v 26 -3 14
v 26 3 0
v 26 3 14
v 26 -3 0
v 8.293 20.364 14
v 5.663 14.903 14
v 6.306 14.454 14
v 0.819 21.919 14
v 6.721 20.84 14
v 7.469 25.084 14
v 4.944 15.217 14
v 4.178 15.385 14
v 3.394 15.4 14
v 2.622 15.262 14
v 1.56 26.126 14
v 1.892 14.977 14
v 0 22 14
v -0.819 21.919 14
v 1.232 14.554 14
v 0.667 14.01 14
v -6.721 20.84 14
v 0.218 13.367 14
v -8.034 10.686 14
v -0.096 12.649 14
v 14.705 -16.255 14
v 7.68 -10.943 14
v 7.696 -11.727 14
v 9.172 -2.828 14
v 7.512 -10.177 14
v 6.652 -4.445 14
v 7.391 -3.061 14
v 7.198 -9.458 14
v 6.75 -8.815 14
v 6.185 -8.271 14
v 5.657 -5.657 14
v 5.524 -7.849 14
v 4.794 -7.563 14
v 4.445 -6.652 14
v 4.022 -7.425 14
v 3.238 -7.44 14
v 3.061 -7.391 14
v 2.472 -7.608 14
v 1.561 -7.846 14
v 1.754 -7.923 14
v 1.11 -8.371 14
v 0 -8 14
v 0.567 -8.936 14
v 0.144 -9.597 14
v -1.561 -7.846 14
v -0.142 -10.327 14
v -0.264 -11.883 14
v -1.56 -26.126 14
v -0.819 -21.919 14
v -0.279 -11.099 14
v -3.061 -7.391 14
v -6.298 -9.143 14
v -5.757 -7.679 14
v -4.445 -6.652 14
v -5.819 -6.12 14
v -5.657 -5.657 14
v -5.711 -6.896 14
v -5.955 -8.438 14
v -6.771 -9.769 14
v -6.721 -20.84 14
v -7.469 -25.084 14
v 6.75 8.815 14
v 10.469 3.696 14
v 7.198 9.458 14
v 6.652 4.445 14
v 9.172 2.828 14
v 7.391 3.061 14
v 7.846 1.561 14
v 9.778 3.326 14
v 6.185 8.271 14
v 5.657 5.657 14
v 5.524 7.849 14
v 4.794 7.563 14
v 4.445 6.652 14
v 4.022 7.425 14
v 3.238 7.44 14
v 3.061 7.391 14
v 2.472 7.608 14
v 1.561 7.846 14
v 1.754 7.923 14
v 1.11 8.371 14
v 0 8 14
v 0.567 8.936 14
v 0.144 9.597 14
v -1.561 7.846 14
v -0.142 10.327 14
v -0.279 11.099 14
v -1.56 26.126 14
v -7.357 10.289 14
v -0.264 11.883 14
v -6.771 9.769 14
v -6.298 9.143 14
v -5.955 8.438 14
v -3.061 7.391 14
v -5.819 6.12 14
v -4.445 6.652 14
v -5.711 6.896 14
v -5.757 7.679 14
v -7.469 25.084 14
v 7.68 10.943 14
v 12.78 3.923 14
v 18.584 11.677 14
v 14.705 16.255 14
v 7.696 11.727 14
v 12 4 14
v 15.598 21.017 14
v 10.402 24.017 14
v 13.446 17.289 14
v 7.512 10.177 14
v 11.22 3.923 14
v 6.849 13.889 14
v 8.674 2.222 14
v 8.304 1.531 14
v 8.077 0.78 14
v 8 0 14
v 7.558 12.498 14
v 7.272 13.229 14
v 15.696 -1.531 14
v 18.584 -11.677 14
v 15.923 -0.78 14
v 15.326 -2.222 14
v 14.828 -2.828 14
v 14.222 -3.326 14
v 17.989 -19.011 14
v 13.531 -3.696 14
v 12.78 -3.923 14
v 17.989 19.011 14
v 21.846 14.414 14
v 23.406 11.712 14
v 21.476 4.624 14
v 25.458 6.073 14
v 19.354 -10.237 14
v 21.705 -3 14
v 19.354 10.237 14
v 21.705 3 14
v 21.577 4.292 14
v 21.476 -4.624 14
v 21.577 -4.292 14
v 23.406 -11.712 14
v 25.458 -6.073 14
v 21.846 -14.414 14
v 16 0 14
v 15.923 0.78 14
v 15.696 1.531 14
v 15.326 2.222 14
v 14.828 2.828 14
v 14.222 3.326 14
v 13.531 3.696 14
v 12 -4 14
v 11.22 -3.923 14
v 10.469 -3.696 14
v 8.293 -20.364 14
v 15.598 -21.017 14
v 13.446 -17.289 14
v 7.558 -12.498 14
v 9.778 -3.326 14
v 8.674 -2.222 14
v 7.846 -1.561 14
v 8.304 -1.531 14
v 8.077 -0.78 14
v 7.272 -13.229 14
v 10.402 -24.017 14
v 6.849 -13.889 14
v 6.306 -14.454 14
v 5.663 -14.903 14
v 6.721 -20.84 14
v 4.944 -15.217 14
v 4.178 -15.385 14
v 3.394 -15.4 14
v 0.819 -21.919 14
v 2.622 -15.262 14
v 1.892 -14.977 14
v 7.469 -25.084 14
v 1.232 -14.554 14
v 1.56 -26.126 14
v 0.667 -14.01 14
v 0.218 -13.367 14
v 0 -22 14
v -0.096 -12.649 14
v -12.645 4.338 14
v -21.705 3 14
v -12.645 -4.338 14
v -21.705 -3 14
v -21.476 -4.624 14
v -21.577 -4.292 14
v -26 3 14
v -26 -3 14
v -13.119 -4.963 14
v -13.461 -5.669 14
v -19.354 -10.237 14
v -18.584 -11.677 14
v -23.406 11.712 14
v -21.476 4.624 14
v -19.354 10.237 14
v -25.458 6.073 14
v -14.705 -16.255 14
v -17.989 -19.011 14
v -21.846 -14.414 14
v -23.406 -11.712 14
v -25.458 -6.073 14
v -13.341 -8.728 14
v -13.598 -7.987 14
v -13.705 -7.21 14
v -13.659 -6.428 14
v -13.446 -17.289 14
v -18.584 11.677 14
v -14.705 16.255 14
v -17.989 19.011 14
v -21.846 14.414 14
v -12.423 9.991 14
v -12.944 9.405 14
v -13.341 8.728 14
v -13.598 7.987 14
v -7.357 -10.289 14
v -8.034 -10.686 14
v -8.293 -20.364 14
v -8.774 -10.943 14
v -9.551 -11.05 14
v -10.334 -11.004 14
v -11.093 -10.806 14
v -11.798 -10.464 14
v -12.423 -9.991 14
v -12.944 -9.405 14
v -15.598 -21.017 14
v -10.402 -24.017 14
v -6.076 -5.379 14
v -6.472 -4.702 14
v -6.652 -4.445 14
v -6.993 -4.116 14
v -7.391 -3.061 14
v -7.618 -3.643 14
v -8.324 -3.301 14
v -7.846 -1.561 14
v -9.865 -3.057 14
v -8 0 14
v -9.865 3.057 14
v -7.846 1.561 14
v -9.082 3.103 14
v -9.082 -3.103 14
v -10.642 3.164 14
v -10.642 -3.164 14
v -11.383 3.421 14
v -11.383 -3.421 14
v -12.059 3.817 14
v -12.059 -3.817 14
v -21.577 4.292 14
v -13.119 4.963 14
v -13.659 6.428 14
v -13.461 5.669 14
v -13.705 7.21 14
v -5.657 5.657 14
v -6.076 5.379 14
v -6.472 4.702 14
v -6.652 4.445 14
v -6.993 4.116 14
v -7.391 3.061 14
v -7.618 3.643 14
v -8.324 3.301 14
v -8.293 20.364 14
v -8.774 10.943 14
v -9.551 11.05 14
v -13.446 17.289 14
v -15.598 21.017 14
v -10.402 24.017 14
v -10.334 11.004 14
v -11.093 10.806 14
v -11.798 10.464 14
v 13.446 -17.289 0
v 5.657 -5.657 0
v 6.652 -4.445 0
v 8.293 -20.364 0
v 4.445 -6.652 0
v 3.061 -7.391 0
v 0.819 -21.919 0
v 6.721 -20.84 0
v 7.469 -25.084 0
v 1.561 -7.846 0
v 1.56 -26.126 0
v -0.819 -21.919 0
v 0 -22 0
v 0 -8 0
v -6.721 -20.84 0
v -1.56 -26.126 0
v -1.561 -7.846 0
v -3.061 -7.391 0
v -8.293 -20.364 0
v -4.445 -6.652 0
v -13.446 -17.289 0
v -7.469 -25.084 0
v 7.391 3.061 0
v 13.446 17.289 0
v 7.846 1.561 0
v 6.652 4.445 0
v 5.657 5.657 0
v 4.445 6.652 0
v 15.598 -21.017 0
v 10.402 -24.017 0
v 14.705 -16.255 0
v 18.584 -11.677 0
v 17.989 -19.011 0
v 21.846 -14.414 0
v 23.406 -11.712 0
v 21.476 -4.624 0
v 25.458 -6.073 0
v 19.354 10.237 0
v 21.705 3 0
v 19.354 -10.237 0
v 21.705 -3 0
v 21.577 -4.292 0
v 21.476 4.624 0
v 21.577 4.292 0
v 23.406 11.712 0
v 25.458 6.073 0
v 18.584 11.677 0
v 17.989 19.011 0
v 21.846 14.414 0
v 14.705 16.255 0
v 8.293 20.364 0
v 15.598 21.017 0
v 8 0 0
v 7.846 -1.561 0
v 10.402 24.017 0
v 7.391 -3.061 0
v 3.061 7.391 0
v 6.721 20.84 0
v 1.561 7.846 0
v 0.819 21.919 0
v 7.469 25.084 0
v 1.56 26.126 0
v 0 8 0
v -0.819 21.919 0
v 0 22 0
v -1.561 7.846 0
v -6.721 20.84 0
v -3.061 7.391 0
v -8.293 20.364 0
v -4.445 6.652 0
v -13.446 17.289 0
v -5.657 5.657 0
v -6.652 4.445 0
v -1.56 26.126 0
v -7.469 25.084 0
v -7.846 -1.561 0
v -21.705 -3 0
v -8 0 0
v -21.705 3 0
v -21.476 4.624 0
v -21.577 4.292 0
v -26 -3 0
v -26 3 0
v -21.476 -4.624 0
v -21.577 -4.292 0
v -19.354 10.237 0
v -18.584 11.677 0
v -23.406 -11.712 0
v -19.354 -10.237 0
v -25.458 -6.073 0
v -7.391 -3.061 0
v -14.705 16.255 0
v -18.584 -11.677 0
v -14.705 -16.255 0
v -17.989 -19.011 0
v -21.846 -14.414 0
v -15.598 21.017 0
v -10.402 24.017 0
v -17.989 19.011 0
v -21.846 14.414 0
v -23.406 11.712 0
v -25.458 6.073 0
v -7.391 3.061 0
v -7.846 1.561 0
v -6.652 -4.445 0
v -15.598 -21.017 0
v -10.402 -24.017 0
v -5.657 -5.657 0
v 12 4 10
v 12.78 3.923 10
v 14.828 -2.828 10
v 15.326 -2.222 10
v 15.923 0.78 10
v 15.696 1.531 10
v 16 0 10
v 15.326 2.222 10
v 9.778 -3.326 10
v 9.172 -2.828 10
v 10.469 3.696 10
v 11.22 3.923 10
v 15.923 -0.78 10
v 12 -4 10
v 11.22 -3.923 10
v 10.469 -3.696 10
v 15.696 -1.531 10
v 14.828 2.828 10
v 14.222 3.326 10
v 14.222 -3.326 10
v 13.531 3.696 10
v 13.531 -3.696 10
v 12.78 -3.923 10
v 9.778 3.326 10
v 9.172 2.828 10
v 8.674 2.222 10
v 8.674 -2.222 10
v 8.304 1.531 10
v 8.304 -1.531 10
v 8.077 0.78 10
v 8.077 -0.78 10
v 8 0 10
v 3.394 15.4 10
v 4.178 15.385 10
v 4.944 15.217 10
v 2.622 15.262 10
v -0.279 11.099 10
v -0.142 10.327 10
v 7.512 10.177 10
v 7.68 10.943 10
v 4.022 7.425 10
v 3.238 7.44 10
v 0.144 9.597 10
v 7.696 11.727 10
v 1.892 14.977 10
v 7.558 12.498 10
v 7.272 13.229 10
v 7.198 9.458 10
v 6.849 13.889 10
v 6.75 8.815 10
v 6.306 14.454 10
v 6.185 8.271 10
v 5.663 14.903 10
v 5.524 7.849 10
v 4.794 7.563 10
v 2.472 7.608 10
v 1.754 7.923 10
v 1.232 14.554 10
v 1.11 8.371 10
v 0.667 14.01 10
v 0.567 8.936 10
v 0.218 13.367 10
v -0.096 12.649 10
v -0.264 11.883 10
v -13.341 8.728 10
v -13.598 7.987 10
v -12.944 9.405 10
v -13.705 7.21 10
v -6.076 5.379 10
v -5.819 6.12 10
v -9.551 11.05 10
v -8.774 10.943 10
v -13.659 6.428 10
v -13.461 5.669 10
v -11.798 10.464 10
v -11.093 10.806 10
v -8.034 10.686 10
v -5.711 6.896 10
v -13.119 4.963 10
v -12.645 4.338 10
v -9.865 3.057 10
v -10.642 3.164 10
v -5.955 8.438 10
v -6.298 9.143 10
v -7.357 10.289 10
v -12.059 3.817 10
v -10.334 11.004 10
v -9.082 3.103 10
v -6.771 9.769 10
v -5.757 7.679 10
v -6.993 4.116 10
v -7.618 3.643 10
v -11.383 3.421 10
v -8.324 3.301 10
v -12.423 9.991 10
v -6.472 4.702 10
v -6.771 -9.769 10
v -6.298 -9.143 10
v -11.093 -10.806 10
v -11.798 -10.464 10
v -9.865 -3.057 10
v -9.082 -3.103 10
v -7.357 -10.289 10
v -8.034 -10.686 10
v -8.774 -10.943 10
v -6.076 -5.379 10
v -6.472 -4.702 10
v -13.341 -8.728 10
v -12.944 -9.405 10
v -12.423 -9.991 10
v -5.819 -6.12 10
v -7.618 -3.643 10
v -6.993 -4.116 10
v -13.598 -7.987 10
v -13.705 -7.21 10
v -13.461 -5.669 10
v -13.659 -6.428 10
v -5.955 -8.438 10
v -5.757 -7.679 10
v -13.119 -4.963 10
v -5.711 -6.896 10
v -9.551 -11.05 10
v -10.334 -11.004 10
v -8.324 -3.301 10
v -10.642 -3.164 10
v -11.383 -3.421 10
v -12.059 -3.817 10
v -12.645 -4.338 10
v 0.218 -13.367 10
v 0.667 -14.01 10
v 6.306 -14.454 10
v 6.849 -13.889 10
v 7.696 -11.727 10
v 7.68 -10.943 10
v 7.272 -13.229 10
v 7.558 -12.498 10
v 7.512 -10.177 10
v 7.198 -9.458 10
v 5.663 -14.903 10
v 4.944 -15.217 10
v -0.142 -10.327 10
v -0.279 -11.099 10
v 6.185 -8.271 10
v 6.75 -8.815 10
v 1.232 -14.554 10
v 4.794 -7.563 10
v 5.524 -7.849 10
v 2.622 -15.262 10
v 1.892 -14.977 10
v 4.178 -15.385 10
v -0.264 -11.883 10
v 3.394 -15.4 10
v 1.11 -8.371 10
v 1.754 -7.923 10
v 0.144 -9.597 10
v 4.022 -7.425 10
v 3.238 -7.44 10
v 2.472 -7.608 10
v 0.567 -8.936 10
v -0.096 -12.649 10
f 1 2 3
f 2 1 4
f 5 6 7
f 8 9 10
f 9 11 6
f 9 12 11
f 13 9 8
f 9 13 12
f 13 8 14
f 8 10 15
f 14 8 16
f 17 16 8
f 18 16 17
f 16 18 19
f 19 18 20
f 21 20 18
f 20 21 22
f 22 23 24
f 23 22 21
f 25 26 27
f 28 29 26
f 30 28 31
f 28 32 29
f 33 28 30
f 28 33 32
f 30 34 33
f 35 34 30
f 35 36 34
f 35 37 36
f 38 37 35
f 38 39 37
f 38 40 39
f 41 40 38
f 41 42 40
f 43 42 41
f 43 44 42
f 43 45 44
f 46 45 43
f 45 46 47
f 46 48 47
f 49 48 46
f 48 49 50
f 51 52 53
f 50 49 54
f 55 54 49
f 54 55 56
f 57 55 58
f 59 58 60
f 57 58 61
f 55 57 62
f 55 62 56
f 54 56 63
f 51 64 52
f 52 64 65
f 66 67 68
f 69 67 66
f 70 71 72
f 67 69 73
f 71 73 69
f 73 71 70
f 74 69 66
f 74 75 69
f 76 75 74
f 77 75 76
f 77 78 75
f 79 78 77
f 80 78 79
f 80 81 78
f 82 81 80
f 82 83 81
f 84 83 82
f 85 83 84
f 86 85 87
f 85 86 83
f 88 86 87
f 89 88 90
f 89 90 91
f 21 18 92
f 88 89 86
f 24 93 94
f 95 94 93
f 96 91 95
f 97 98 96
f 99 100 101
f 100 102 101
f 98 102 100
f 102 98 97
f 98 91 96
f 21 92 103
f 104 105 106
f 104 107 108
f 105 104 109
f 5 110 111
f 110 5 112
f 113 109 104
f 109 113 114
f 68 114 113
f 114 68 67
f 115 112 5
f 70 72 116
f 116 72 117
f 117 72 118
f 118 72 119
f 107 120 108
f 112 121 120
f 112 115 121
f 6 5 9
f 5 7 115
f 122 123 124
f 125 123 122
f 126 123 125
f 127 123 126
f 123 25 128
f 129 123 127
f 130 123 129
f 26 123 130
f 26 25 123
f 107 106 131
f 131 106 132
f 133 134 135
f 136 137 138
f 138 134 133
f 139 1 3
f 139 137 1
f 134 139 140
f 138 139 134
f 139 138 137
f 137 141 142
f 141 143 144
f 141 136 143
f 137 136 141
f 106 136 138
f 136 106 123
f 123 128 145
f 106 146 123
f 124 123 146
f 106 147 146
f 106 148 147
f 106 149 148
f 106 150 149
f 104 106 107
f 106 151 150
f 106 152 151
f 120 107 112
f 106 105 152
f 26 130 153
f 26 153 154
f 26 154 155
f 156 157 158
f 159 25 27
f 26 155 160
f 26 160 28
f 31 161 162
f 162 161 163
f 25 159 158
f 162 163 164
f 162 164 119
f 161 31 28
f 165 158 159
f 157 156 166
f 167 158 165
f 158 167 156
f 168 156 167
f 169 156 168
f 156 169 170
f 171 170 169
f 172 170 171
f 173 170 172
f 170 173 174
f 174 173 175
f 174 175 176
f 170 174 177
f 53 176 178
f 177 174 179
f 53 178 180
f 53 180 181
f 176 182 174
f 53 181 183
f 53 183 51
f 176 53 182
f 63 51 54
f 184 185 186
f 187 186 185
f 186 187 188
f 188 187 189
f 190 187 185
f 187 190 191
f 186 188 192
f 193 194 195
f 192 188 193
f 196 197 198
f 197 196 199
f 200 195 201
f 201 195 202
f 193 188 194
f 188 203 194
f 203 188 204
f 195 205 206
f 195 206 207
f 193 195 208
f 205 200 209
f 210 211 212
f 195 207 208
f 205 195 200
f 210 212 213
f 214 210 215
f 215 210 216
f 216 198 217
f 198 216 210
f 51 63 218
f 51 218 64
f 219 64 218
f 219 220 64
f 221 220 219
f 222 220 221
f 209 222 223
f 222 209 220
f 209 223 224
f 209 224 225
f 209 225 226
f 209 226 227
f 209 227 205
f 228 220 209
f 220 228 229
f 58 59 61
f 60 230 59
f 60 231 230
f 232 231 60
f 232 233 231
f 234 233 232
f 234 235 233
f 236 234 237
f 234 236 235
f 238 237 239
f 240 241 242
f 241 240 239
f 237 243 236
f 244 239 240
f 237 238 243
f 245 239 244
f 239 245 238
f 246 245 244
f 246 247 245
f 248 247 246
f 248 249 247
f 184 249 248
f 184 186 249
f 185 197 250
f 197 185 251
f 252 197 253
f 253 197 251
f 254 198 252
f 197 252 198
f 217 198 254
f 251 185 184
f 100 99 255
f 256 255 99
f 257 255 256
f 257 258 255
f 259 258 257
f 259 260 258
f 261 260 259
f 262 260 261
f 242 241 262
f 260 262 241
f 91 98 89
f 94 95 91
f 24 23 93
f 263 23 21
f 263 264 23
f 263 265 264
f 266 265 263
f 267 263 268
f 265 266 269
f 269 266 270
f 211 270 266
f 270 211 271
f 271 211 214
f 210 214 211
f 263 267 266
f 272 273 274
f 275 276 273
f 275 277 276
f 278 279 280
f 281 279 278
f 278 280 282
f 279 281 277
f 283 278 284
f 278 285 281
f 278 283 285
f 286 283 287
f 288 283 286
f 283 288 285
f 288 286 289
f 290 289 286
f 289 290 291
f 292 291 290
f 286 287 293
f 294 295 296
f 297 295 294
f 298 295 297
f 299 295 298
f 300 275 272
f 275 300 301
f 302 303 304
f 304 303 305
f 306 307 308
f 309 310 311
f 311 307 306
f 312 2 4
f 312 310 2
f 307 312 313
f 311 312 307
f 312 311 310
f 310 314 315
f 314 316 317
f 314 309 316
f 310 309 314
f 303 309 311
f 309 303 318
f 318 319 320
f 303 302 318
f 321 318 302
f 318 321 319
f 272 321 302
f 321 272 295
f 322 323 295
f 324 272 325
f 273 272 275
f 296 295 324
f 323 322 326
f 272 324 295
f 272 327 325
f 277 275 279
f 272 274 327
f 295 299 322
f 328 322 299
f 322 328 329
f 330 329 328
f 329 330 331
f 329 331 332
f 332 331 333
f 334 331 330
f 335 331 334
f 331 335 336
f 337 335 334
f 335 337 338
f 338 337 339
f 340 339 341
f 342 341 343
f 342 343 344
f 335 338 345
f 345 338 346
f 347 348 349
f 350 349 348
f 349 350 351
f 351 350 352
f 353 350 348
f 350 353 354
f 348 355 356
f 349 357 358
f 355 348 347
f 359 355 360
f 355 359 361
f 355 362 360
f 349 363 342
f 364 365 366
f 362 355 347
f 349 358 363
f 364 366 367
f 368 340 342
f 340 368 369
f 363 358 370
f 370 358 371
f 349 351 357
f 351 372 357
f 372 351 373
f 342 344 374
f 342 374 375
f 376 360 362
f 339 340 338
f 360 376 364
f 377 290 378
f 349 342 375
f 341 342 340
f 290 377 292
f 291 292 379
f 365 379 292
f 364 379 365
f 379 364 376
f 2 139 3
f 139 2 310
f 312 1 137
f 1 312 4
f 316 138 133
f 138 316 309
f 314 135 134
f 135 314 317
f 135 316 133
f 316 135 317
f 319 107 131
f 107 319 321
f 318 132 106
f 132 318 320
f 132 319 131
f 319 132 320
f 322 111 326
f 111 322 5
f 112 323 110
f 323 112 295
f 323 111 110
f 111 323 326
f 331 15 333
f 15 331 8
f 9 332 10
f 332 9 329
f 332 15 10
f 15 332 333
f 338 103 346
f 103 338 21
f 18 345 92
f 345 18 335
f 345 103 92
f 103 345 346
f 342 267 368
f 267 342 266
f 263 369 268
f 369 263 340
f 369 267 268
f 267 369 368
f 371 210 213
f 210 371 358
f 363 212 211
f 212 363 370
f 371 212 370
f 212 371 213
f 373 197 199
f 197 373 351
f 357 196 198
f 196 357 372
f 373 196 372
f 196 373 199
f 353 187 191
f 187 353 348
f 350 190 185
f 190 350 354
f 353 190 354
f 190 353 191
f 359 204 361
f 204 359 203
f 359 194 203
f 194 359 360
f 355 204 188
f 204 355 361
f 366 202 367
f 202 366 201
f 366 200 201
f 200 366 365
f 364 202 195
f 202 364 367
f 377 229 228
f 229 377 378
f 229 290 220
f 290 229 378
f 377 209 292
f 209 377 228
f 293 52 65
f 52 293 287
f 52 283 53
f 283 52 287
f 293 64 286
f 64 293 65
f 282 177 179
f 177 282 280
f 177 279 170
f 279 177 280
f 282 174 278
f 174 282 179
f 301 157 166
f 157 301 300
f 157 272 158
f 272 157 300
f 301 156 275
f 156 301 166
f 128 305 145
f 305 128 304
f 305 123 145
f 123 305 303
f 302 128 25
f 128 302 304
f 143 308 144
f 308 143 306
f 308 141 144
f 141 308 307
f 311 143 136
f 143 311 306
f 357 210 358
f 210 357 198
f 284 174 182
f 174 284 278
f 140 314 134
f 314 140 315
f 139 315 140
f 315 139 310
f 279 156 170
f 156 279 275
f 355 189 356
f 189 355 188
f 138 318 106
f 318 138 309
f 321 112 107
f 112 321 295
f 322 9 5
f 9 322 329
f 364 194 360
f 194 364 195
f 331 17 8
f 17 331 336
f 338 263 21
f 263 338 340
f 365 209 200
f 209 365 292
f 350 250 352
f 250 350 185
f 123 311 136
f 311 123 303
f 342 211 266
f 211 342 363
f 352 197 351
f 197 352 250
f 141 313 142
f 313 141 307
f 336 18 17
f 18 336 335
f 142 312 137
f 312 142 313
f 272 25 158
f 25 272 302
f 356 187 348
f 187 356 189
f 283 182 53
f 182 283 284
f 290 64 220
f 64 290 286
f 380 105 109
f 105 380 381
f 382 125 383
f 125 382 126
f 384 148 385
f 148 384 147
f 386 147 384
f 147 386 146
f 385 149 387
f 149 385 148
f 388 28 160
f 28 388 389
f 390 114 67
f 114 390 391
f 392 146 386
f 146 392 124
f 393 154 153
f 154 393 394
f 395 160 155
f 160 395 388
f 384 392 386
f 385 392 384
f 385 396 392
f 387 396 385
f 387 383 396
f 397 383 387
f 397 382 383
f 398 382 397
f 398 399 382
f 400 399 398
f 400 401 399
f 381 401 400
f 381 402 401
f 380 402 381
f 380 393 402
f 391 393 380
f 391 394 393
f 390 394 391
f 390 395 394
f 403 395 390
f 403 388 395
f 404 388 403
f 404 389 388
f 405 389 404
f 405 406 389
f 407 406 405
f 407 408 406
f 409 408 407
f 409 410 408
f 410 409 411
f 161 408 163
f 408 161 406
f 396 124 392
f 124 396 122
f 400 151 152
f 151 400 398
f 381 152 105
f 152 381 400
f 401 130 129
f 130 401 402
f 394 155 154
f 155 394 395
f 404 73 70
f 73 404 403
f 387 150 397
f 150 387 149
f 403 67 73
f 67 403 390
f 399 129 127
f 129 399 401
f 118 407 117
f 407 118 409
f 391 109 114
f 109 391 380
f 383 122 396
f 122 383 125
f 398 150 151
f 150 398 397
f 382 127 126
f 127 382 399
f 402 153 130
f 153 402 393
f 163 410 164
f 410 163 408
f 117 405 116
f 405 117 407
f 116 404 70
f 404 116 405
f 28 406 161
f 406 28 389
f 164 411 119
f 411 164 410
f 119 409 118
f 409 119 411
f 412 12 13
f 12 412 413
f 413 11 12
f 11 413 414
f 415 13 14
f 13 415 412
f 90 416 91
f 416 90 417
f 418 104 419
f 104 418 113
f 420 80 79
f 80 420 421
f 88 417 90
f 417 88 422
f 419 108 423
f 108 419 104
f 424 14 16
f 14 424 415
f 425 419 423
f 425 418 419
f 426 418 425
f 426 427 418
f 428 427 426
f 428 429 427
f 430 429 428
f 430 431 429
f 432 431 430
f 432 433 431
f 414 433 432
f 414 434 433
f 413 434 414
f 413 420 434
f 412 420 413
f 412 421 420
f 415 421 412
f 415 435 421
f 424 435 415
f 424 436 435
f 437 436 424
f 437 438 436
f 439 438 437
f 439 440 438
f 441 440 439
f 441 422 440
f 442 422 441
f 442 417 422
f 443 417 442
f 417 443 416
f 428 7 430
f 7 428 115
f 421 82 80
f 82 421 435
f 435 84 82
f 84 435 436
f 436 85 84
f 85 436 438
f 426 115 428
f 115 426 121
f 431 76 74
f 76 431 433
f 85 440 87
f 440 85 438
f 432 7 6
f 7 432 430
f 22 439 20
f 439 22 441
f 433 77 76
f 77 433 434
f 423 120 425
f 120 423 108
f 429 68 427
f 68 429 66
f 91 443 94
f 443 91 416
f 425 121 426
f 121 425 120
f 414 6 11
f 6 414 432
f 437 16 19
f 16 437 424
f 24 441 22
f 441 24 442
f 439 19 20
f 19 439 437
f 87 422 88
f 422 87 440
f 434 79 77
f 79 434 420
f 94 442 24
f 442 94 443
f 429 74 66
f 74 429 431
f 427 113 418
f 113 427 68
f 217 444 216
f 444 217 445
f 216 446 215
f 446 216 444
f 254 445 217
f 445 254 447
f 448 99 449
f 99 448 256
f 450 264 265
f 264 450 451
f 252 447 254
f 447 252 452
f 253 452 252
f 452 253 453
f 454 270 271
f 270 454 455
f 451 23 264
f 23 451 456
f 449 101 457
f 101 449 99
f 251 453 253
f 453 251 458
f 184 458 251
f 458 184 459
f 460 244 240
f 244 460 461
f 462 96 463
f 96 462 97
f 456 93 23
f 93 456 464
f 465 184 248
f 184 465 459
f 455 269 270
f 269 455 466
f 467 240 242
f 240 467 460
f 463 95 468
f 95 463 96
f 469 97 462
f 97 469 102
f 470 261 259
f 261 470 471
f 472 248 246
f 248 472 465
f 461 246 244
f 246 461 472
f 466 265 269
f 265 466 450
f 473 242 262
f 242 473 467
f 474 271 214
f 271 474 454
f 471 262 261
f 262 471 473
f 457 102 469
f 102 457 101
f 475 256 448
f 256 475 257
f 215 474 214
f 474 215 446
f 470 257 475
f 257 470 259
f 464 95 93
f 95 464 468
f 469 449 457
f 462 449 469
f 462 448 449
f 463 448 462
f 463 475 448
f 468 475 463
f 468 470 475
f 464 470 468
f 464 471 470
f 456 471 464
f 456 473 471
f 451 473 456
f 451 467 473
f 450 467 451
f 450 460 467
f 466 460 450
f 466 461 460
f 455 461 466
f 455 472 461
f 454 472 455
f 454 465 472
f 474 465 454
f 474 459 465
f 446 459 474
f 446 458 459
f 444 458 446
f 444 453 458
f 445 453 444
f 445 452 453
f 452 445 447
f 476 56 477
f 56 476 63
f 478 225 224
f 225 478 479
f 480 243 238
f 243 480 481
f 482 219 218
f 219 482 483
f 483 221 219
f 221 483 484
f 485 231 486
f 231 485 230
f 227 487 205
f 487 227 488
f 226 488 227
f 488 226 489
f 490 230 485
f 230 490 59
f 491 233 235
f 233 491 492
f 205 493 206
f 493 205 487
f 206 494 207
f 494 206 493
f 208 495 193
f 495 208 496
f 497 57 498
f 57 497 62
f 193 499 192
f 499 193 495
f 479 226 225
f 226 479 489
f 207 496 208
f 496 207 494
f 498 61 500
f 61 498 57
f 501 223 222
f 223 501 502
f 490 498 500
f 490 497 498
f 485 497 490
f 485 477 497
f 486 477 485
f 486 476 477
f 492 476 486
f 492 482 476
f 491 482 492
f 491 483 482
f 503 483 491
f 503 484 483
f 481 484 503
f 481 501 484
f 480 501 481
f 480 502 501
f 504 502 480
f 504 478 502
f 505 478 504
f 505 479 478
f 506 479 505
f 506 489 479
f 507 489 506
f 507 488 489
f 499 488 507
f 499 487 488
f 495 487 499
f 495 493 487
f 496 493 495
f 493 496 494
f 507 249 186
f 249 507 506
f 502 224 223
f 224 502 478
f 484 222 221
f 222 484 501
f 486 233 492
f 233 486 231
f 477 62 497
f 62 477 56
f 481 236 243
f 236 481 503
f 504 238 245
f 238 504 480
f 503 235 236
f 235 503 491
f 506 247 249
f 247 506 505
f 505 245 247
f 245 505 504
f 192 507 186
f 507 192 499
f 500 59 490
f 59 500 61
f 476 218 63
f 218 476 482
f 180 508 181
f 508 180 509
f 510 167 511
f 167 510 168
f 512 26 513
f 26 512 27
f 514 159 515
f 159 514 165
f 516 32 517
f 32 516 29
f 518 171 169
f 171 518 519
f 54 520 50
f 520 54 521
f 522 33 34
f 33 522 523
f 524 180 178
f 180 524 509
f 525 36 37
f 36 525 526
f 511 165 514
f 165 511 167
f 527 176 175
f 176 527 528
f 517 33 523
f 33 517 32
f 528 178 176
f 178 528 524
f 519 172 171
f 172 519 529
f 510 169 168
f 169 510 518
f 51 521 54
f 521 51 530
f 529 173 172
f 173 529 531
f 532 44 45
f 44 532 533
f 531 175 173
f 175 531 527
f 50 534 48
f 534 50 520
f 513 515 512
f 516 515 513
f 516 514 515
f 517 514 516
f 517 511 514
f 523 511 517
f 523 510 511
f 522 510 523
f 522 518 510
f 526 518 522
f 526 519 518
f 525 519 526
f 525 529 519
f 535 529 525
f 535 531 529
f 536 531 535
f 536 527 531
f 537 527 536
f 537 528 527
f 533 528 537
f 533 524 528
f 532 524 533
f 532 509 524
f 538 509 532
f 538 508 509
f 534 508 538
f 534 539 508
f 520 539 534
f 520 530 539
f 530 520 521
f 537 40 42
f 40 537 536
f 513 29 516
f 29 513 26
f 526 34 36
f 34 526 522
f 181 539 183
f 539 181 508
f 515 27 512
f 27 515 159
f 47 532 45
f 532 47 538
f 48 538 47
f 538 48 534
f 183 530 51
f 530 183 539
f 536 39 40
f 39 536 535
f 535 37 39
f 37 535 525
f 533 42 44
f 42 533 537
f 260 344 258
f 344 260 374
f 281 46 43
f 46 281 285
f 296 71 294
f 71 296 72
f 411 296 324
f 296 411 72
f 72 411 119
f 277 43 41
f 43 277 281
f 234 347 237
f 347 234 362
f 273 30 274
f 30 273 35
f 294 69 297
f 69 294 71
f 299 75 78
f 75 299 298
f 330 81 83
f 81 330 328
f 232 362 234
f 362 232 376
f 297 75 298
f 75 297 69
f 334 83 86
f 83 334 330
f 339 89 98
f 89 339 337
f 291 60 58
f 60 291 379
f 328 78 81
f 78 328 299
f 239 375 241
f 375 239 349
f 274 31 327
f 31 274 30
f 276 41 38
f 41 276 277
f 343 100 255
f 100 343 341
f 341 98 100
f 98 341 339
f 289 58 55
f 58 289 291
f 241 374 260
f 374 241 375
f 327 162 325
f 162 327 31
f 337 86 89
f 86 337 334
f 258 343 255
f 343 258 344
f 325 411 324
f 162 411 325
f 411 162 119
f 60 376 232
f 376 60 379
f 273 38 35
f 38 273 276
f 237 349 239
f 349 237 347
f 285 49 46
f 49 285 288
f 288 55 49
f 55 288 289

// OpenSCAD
$fn = 32;

// ----------------------------------------------------------------------
// Spur blank: lightened gear blank
// ----------------------------------------------------------------------

// --- parameters (mm) ---
disc_r = 22;              // blank root radius
disc_t = 14;              // blank thickness
n_teeth = 18;             // stub tooth count
tooth_w = 6;              // tooth width at the root
tooth_h = 4;              // tooth height above the root
bore_r = 8;               // central bore radius
ring_r = 12;              // lightening pocket ring radius
pocket_r = 4;             // lightening pocket radius
fit_tol = 0.1;            // tolerance for press fits, mm
free_tol = 0.5;           // tolerance for clearance fits, mm

out_r = disc_r + tooth_h;  // tip radius
bbox_x = 52.0;  // measured width over the teeth
bbox_y = 52.25;  // measured depth over the teeth

difference() {
union() {
  cylinder(r = disc_r, h = disc_t);
  for (i = [0 : n_teeth - 1])
    rotate([0, 0, i * 360 / n_teeth])
      translate([disc_r - 1, -tooth_w / 2, 0])
        cube([tooth_h + 1, tooth_w, disc_t]);
}
  translate([0, 0, -1]) cylinder(r = bore_r, h = disc_t + 2);
  for (i = [0 : 5])
    rotate([0, 0, i * 72])
      translate([ring_r, 0, disc_t - 4])
        cylinder(r = pocket_r, h = 5);
}
